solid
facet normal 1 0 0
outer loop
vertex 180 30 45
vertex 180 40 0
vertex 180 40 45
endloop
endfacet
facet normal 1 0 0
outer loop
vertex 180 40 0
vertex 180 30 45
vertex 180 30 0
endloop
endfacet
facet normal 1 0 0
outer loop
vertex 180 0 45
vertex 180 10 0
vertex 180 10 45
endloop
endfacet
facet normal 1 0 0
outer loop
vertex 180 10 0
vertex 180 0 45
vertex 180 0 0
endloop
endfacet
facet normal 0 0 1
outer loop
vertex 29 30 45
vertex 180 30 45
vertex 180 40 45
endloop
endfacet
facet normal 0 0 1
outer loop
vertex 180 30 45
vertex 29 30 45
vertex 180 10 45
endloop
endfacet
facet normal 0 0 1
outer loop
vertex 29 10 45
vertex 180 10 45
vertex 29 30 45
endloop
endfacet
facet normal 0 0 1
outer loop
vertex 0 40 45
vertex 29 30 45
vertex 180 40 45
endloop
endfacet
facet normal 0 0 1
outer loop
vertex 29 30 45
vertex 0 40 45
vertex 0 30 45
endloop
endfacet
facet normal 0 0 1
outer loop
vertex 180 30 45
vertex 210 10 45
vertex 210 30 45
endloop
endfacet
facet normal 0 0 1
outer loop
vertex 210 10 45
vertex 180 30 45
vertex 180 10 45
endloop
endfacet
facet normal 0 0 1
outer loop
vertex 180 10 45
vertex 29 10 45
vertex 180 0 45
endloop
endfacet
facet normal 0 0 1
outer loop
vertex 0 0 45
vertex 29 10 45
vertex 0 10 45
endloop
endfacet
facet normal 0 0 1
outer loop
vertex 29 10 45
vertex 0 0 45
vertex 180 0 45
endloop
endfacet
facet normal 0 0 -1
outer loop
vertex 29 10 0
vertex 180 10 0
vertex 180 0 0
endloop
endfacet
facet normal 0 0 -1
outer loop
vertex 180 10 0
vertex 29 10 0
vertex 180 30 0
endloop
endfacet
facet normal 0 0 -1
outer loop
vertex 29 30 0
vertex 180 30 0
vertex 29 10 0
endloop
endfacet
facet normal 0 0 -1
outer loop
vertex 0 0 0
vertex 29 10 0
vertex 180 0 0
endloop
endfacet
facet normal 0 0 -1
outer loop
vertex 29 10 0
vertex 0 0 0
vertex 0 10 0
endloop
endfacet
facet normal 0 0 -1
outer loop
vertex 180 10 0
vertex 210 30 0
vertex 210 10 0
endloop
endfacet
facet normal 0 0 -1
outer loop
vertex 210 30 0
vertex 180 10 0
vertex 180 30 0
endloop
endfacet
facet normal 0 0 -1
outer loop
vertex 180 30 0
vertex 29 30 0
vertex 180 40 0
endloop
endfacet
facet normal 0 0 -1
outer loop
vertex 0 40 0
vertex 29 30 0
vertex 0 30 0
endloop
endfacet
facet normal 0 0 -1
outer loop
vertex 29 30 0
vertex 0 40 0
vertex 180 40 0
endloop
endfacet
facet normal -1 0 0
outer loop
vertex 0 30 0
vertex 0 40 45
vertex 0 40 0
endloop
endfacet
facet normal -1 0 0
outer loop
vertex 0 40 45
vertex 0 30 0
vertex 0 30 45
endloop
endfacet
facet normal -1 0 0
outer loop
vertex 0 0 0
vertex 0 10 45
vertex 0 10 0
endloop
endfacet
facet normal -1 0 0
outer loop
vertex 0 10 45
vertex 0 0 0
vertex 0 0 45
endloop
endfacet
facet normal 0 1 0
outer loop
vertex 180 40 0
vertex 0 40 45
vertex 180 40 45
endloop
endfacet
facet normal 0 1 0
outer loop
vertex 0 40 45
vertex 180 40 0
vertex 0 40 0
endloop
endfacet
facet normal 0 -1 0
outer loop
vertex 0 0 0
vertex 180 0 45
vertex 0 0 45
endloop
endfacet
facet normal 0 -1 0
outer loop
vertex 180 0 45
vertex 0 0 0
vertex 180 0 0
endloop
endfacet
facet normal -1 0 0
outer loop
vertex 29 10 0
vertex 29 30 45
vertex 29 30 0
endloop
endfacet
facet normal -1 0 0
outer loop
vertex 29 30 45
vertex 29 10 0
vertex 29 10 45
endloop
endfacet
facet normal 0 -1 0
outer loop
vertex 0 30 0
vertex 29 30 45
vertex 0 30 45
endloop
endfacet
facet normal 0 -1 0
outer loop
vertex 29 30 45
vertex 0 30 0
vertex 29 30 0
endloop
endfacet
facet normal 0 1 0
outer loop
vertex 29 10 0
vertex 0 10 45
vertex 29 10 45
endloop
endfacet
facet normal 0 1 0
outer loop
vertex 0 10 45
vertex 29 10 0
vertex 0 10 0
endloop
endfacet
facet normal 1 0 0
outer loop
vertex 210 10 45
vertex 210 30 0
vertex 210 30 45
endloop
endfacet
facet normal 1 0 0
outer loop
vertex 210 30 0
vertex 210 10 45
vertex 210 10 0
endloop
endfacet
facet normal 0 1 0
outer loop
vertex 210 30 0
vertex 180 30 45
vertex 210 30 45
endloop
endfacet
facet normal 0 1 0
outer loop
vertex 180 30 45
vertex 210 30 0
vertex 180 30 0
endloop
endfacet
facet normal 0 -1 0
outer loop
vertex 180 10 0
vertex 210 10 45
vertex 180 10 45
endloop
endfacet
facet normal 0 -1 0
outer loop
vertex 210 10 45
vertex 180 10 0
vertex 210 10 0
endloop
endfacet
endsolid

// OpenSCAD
difference()
{
  cube([180,40,45]);
  translate([-1,10,-1]) cube([30,20,50]);
}
translate([180,10,0]) cube([30,20,45]);
